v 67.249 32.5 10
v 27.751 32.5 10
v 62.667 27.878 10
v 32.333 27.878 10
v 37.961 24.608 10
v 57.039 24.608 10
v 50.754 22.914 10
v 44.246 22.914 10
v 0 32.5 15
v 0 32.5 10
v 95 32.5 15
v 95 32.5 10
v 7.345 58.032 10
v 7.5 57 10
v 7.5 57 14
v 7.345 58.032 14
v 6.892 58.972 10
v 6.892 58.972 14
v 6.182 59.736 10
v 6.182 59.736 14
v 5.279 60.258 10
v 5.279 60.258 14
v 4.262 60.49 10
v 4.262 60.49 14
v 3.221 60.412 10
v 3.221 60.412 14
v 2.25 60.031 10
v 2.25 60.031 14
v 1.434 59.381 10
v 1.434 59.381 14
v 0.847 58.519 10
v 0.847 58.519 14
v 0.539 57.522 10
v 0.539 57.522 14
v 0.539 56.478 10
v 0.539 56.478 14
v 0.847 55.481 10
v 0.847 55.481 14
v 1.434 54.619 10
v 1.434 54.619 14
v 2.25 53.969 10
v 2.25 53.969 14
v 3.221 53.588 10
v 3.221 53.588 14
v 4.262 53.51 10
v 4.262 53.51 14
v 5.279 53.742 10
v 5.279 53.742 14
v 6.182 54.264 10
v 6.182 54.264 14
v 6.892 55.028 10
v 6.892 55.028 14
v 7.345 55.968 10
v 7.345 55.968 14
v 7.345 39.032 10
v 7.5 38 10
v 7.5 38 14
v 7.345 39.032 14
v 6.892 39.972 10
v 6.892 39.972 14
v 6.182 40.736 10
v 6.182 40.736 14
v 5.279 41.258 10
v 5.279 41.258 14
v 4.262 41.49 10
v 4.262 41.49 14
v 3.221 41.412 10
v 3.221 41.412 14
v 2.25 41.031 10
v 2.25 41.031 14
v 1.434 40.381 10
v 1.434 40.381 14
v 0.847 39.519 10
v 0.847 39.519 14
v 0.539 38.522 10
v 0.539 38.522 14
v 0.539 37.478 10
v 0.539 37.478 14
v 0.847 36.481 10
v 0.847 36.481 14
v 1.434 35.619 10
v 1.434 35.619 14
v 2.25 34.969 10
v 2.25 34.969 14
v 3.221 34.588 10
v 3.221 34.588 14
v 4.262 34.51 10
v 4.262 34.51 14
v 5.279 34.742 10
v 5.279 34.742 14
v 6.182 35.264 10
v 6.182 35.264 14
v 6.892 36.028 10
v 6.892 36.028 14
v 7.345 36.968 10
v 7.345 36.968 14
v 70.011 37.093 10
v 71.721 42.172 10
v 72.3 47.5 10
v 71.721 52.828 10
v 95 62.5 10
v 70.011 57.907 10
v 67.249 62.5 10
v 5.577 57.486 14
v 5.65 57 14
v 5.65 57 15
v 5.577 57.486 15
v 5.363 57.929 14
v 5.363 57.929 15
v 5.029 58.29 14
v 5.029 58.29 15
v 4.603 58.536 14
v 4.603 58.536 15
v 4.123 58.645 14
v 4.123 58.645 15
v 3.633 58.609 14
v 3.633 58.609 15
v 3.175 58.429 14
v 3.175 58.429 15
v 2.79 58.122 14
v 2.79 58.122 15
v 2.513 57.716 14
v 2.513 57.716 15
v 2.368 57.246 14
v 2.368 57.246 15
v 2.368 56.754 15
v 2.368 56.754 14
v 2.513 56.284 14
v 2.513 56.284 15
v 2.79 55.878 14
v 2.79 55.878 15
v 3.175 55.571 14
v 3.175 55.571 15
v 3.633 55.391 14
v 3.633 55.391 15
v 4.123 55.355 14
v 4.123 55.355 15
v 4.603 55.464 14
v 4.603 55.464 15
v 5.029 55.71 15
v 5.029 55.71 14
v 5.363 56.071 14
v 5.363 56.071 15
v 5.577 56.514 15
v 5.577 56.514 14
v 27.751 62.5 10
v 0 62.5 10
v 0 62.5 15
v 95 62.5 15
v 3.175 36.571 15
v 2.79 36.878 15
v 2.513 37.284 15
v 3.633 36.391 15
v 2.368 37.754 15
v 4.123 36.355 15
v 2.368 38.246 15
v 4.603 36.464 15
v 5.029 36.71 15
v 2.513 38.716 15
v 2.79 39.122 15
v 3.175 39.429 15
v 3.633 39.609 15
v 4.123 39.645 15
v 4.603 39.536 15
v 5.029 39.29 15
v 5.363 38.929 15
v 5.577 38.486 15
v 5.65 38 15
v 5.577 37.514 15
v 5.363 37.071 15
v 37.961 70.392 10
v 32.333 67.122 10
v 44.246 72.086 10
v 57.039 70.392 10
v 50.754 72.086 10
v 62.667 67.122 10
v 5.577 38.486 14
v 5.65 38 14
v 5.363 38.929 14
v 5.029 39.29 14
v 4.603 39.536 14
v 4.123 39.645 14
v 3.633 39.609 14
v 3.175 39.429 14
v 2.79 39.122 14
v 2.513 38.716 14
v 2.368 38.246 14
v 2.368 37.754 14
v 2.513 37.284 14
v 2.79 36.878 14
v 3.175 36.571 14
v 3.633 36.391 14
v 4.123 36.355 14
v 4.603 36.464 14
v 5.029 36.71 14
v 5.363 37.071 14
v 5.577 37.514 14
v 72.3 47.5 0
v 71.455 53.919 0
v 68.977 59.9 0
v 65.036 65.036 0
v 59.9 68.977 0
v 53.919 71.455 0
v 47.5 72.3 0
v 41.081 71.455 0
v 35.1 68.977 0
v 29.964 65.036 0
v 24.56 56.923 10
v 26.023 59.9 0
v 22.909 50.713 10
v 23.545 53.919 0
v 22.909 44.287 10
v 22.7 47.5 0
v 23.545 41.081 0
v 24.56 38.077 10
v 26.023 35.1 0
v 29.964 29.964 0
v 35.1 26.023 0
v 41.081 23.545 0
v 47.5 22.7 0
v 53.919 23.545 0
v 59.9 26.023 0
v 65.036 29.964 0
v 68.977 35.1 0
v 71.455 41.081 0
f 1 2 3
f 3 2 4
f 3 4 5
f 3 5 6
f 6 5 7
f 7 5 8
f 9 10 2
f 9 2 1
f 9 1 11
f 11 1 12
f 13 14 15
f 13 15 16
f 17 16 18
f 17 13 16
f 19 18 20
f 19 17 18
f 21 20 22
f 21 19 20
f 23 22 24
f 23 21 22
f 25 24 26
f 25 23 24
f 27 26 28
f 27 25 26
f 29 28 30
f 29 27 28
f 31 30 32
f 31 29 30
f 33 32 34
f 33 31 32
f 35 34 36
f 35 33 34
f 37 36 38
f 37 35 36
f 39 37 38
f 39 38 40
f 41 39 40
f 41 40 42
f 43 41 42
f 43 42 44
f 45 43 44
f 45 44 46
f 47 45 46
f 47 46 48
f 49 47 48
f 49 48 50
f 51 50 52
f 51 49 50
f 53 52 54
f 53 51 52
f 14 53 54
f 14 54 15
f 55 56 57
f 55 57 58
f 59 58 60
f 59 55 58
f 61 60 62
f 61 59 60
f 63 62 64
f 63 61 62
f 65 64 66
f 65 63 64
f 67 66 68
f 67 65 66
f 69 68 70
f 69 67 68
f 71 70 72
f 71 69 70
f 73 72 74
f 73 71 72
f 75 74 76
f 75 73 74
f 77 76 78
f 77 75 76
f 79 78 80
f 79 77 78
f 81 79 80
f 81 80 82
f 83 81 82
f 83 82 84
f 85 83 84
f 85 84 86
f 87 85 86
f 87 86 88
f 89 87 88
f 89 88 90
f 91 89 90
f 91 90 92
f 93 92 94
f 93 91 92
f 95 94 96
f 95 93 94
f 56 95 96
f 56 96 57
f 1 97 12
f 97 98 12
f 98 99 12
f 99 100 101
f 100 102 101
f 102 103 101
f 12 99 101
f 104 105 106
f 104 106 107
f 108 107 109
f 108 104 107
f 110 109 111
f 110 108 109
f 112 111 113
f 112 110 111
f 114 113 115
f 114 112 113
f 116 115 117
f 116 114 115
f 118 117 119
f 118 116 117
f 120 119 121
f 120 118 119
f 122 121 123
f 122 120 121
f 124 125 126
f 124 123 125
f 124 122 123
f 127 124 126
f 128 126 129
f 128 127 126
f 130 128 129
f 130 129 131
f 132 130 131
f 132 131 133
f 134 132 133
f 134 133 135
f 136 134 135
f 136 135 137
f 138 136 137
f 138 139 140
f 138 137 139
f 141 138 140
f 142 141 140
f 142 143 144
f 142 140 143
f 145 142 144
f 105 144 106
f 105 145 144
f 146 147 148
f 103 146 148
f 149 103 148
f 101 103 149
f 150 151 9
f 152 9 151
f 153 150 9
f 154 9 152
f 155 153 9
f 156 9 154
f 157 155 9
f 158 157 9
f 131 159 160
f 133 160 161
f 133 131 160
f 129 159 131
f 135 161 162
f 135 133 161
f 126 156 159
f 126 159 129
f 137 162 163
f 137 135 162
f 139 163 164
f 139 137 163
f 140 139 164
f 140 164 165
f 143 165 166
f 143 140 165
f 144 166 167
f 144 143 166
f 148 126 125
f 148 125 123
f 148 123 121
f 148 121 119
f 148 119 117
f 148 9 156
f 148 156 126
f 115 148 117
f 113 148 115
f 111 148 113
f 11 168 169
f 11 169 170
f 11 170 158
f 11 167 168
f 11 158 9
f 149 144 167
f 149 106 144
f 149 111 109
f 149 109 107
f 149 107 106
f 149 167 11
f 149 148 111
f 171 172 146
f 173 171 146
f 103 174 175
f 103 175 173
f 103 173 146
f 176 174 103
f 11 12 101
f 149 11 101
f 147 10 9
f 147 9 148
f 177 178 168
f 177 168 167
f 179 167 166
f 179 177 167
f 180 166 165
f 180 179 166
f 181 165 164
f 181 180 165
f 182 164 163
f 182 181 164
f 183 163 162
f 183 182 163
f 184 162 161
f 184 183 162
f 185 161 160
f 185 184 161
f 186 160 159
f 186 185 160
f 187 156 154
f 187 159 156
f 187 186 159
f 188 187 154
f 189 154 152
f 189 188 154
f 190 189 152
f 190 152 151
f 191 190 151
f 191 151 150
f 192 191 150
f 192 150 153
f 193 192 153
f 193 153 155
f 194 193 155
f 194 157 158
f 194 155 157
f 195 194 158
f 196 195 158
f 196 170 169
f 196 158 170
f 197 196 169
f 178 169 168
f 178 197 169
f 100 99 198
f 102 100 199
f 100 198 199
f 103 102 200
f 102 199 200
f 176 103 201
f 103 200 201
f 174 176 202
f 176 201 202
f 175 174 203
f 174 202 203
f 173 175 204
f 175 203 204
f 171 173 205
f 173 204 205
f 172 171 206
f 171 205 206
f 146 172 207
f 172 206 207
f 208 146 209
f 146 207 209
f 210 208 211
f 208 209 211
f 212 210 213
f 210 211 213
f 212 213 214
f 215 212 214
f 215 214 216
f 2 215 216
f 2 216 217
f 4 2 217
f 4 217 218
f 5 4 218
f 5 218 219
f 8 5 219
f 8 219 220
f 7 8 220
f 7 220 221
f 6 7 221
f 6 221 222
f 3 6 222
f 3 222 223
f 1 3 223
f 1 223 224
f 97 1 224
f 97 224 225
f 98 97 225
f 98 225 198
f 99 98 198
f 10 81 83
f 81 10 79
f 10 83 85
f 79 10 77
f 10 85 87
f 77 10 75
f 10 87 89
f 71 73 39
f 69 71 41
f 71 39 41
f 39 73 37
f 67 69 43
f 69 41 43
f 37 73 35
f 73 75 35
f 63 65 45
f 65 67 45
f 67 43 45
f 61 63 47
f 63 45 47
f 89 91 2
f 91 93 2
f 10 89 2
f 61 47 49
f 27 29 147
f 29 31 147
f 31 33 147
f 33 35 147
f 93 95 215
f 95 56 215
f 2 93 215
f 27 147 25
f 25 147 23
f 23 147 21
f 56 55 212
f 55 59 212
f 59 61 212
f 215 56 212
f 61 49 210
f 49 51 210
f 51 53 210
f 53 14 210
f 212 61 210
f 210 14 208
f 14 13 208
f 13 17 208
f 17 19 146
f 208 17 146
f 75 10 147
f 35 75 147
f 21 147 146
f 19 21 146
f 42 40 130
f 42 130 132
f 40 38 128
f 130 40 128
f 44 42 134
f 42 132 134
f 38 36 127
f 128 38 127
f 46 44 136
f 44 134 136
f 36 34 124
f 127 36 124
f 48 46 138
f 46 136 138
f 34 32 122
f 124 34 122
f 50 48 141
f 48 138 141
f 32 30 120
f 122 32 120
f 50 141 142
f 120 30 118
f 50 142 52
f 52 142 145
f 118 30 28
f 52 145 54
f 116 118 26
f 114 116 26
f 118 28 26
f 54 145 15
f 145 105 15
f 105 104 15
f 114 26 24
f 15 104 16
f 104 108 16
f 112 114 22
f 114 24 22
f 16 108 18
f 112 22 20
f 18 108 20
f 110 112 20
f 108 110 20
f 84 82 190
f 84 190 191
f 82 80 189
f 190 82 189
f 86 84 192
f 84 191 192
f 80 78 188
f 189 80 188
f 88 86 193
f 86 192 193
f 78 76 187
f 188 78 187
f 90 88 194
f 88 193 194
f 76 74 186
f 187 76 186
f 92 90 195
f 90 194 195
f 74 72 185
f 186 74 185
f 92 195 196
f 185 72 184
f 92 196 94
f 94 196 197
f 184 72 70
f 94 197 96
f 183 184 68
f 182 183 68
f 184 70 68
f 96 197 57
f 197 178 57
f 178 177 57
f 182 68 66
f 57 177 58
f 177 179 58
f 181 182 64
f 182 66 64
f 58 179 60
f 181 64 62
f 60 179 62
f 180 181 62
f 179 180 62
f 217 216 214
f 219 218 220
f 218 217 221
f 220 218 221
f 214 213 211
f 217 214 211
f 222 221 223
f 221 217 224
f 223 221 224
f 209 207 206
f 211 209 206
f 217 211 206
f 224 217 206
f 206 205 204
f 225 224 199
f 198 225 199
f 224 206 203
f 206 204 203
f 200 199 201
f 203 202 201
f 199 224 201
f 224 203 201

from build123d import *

# Parameters (mm, degrees)
CYLINDER017_R     = 3.5
CYLINDER017_DEPTH = 4
CYLINDER015_R     = 1.65
CYLINDER015_DEPTH = 20
CYLINDER016_R     = 3.5
CYLINDER016_DEPTH = 4
CYLINDER014_R     = 1.65
CYLINDER014_DEPTH = 20
BOX001_W          = 95
BOX001_H          = 30
BOX001_DEPTH      = 5
CYLINDER010_R     = 24.8
CYLINDER010_DEPTH = 10


with BuildPart() as zylinder017:
    # Cylinder017 → Cylinder017 (new body)
    with BuildSketch(Plane.XY):
        Circle(CYLINDER017_R)
    extrude(amount=CYLINDER017_DEPTH)


with BuildPart() as screw02:
    # Cylinder015 → Cylinder015 (new body)
    with BuildSketch(Plane.XY):
        Circle(CYLINDER015_R)
    extrude(amount=CYLINDER015_DEPTH)

    # Fusion003: union Zylinder017
    add(zylinder017.part)


with BuildPart() as screw02_1:
    # Fusion003 placement: moved
    add(screw02.part.moved(Location((4, 57, 10))))


with BuildPart() as zylinder016:
    # Cylinder016 → Cylinder016 (new body)
    with BuildSketch(Plane.XY):
        Circle(CYLINDER016_R)
    extrude(amount=CYLINDER016_DEPTH)


with BuildPart() as compound002:
    # Cylinder014 → Cylinder014 (new body)
    with BuildSketch(Plane.XY):
        Circle(CYLINDER014_R)
    extrude(amount=CYLINDER014_DEPTH)

    # Fusion002: union Zylinder016
    add(zylinder016.part)


with BuildPart() as compound002_1:
    # Fusion002 placement: moved
    add(compound002.part.moved(Location((4, 38, 10))))

    # Compound002: union Screw02
    add(screw02_1.part)


with BuildPart() as w_rfel001:
    # Box001 → Box001 (new body)
    with BuildSketch(Plane(origin=(0, 32.5, 10), x_dir=(1, 0, 0), z_dir=(0, 0, 1))):
        with Locations((47.5, 15)):
            Rectangle(BOX001_W, BOX001_H)
    extrude(amount=BOX001_DEPTH)


with BuildPart() as rotatingtable:
    # Cylinder010 → Cylinder010 (new body)
    with BuildSketch(Plane(origin=(47.5, 47.5, 0), x_dir=(1, 0, 0), z_dir=(0, 0, 1))):
        Circle(CYLINDER010_R)
    extrude(amount=CYLINDER010_DEPTH)

    # Fusion001: union Würfel001
    add(w_rfel001.part)

    # Cut006: cut Compound002
    add(compound002_1.part, mode=Mode.SUBTRACT)


solid = rotatingtable.part
